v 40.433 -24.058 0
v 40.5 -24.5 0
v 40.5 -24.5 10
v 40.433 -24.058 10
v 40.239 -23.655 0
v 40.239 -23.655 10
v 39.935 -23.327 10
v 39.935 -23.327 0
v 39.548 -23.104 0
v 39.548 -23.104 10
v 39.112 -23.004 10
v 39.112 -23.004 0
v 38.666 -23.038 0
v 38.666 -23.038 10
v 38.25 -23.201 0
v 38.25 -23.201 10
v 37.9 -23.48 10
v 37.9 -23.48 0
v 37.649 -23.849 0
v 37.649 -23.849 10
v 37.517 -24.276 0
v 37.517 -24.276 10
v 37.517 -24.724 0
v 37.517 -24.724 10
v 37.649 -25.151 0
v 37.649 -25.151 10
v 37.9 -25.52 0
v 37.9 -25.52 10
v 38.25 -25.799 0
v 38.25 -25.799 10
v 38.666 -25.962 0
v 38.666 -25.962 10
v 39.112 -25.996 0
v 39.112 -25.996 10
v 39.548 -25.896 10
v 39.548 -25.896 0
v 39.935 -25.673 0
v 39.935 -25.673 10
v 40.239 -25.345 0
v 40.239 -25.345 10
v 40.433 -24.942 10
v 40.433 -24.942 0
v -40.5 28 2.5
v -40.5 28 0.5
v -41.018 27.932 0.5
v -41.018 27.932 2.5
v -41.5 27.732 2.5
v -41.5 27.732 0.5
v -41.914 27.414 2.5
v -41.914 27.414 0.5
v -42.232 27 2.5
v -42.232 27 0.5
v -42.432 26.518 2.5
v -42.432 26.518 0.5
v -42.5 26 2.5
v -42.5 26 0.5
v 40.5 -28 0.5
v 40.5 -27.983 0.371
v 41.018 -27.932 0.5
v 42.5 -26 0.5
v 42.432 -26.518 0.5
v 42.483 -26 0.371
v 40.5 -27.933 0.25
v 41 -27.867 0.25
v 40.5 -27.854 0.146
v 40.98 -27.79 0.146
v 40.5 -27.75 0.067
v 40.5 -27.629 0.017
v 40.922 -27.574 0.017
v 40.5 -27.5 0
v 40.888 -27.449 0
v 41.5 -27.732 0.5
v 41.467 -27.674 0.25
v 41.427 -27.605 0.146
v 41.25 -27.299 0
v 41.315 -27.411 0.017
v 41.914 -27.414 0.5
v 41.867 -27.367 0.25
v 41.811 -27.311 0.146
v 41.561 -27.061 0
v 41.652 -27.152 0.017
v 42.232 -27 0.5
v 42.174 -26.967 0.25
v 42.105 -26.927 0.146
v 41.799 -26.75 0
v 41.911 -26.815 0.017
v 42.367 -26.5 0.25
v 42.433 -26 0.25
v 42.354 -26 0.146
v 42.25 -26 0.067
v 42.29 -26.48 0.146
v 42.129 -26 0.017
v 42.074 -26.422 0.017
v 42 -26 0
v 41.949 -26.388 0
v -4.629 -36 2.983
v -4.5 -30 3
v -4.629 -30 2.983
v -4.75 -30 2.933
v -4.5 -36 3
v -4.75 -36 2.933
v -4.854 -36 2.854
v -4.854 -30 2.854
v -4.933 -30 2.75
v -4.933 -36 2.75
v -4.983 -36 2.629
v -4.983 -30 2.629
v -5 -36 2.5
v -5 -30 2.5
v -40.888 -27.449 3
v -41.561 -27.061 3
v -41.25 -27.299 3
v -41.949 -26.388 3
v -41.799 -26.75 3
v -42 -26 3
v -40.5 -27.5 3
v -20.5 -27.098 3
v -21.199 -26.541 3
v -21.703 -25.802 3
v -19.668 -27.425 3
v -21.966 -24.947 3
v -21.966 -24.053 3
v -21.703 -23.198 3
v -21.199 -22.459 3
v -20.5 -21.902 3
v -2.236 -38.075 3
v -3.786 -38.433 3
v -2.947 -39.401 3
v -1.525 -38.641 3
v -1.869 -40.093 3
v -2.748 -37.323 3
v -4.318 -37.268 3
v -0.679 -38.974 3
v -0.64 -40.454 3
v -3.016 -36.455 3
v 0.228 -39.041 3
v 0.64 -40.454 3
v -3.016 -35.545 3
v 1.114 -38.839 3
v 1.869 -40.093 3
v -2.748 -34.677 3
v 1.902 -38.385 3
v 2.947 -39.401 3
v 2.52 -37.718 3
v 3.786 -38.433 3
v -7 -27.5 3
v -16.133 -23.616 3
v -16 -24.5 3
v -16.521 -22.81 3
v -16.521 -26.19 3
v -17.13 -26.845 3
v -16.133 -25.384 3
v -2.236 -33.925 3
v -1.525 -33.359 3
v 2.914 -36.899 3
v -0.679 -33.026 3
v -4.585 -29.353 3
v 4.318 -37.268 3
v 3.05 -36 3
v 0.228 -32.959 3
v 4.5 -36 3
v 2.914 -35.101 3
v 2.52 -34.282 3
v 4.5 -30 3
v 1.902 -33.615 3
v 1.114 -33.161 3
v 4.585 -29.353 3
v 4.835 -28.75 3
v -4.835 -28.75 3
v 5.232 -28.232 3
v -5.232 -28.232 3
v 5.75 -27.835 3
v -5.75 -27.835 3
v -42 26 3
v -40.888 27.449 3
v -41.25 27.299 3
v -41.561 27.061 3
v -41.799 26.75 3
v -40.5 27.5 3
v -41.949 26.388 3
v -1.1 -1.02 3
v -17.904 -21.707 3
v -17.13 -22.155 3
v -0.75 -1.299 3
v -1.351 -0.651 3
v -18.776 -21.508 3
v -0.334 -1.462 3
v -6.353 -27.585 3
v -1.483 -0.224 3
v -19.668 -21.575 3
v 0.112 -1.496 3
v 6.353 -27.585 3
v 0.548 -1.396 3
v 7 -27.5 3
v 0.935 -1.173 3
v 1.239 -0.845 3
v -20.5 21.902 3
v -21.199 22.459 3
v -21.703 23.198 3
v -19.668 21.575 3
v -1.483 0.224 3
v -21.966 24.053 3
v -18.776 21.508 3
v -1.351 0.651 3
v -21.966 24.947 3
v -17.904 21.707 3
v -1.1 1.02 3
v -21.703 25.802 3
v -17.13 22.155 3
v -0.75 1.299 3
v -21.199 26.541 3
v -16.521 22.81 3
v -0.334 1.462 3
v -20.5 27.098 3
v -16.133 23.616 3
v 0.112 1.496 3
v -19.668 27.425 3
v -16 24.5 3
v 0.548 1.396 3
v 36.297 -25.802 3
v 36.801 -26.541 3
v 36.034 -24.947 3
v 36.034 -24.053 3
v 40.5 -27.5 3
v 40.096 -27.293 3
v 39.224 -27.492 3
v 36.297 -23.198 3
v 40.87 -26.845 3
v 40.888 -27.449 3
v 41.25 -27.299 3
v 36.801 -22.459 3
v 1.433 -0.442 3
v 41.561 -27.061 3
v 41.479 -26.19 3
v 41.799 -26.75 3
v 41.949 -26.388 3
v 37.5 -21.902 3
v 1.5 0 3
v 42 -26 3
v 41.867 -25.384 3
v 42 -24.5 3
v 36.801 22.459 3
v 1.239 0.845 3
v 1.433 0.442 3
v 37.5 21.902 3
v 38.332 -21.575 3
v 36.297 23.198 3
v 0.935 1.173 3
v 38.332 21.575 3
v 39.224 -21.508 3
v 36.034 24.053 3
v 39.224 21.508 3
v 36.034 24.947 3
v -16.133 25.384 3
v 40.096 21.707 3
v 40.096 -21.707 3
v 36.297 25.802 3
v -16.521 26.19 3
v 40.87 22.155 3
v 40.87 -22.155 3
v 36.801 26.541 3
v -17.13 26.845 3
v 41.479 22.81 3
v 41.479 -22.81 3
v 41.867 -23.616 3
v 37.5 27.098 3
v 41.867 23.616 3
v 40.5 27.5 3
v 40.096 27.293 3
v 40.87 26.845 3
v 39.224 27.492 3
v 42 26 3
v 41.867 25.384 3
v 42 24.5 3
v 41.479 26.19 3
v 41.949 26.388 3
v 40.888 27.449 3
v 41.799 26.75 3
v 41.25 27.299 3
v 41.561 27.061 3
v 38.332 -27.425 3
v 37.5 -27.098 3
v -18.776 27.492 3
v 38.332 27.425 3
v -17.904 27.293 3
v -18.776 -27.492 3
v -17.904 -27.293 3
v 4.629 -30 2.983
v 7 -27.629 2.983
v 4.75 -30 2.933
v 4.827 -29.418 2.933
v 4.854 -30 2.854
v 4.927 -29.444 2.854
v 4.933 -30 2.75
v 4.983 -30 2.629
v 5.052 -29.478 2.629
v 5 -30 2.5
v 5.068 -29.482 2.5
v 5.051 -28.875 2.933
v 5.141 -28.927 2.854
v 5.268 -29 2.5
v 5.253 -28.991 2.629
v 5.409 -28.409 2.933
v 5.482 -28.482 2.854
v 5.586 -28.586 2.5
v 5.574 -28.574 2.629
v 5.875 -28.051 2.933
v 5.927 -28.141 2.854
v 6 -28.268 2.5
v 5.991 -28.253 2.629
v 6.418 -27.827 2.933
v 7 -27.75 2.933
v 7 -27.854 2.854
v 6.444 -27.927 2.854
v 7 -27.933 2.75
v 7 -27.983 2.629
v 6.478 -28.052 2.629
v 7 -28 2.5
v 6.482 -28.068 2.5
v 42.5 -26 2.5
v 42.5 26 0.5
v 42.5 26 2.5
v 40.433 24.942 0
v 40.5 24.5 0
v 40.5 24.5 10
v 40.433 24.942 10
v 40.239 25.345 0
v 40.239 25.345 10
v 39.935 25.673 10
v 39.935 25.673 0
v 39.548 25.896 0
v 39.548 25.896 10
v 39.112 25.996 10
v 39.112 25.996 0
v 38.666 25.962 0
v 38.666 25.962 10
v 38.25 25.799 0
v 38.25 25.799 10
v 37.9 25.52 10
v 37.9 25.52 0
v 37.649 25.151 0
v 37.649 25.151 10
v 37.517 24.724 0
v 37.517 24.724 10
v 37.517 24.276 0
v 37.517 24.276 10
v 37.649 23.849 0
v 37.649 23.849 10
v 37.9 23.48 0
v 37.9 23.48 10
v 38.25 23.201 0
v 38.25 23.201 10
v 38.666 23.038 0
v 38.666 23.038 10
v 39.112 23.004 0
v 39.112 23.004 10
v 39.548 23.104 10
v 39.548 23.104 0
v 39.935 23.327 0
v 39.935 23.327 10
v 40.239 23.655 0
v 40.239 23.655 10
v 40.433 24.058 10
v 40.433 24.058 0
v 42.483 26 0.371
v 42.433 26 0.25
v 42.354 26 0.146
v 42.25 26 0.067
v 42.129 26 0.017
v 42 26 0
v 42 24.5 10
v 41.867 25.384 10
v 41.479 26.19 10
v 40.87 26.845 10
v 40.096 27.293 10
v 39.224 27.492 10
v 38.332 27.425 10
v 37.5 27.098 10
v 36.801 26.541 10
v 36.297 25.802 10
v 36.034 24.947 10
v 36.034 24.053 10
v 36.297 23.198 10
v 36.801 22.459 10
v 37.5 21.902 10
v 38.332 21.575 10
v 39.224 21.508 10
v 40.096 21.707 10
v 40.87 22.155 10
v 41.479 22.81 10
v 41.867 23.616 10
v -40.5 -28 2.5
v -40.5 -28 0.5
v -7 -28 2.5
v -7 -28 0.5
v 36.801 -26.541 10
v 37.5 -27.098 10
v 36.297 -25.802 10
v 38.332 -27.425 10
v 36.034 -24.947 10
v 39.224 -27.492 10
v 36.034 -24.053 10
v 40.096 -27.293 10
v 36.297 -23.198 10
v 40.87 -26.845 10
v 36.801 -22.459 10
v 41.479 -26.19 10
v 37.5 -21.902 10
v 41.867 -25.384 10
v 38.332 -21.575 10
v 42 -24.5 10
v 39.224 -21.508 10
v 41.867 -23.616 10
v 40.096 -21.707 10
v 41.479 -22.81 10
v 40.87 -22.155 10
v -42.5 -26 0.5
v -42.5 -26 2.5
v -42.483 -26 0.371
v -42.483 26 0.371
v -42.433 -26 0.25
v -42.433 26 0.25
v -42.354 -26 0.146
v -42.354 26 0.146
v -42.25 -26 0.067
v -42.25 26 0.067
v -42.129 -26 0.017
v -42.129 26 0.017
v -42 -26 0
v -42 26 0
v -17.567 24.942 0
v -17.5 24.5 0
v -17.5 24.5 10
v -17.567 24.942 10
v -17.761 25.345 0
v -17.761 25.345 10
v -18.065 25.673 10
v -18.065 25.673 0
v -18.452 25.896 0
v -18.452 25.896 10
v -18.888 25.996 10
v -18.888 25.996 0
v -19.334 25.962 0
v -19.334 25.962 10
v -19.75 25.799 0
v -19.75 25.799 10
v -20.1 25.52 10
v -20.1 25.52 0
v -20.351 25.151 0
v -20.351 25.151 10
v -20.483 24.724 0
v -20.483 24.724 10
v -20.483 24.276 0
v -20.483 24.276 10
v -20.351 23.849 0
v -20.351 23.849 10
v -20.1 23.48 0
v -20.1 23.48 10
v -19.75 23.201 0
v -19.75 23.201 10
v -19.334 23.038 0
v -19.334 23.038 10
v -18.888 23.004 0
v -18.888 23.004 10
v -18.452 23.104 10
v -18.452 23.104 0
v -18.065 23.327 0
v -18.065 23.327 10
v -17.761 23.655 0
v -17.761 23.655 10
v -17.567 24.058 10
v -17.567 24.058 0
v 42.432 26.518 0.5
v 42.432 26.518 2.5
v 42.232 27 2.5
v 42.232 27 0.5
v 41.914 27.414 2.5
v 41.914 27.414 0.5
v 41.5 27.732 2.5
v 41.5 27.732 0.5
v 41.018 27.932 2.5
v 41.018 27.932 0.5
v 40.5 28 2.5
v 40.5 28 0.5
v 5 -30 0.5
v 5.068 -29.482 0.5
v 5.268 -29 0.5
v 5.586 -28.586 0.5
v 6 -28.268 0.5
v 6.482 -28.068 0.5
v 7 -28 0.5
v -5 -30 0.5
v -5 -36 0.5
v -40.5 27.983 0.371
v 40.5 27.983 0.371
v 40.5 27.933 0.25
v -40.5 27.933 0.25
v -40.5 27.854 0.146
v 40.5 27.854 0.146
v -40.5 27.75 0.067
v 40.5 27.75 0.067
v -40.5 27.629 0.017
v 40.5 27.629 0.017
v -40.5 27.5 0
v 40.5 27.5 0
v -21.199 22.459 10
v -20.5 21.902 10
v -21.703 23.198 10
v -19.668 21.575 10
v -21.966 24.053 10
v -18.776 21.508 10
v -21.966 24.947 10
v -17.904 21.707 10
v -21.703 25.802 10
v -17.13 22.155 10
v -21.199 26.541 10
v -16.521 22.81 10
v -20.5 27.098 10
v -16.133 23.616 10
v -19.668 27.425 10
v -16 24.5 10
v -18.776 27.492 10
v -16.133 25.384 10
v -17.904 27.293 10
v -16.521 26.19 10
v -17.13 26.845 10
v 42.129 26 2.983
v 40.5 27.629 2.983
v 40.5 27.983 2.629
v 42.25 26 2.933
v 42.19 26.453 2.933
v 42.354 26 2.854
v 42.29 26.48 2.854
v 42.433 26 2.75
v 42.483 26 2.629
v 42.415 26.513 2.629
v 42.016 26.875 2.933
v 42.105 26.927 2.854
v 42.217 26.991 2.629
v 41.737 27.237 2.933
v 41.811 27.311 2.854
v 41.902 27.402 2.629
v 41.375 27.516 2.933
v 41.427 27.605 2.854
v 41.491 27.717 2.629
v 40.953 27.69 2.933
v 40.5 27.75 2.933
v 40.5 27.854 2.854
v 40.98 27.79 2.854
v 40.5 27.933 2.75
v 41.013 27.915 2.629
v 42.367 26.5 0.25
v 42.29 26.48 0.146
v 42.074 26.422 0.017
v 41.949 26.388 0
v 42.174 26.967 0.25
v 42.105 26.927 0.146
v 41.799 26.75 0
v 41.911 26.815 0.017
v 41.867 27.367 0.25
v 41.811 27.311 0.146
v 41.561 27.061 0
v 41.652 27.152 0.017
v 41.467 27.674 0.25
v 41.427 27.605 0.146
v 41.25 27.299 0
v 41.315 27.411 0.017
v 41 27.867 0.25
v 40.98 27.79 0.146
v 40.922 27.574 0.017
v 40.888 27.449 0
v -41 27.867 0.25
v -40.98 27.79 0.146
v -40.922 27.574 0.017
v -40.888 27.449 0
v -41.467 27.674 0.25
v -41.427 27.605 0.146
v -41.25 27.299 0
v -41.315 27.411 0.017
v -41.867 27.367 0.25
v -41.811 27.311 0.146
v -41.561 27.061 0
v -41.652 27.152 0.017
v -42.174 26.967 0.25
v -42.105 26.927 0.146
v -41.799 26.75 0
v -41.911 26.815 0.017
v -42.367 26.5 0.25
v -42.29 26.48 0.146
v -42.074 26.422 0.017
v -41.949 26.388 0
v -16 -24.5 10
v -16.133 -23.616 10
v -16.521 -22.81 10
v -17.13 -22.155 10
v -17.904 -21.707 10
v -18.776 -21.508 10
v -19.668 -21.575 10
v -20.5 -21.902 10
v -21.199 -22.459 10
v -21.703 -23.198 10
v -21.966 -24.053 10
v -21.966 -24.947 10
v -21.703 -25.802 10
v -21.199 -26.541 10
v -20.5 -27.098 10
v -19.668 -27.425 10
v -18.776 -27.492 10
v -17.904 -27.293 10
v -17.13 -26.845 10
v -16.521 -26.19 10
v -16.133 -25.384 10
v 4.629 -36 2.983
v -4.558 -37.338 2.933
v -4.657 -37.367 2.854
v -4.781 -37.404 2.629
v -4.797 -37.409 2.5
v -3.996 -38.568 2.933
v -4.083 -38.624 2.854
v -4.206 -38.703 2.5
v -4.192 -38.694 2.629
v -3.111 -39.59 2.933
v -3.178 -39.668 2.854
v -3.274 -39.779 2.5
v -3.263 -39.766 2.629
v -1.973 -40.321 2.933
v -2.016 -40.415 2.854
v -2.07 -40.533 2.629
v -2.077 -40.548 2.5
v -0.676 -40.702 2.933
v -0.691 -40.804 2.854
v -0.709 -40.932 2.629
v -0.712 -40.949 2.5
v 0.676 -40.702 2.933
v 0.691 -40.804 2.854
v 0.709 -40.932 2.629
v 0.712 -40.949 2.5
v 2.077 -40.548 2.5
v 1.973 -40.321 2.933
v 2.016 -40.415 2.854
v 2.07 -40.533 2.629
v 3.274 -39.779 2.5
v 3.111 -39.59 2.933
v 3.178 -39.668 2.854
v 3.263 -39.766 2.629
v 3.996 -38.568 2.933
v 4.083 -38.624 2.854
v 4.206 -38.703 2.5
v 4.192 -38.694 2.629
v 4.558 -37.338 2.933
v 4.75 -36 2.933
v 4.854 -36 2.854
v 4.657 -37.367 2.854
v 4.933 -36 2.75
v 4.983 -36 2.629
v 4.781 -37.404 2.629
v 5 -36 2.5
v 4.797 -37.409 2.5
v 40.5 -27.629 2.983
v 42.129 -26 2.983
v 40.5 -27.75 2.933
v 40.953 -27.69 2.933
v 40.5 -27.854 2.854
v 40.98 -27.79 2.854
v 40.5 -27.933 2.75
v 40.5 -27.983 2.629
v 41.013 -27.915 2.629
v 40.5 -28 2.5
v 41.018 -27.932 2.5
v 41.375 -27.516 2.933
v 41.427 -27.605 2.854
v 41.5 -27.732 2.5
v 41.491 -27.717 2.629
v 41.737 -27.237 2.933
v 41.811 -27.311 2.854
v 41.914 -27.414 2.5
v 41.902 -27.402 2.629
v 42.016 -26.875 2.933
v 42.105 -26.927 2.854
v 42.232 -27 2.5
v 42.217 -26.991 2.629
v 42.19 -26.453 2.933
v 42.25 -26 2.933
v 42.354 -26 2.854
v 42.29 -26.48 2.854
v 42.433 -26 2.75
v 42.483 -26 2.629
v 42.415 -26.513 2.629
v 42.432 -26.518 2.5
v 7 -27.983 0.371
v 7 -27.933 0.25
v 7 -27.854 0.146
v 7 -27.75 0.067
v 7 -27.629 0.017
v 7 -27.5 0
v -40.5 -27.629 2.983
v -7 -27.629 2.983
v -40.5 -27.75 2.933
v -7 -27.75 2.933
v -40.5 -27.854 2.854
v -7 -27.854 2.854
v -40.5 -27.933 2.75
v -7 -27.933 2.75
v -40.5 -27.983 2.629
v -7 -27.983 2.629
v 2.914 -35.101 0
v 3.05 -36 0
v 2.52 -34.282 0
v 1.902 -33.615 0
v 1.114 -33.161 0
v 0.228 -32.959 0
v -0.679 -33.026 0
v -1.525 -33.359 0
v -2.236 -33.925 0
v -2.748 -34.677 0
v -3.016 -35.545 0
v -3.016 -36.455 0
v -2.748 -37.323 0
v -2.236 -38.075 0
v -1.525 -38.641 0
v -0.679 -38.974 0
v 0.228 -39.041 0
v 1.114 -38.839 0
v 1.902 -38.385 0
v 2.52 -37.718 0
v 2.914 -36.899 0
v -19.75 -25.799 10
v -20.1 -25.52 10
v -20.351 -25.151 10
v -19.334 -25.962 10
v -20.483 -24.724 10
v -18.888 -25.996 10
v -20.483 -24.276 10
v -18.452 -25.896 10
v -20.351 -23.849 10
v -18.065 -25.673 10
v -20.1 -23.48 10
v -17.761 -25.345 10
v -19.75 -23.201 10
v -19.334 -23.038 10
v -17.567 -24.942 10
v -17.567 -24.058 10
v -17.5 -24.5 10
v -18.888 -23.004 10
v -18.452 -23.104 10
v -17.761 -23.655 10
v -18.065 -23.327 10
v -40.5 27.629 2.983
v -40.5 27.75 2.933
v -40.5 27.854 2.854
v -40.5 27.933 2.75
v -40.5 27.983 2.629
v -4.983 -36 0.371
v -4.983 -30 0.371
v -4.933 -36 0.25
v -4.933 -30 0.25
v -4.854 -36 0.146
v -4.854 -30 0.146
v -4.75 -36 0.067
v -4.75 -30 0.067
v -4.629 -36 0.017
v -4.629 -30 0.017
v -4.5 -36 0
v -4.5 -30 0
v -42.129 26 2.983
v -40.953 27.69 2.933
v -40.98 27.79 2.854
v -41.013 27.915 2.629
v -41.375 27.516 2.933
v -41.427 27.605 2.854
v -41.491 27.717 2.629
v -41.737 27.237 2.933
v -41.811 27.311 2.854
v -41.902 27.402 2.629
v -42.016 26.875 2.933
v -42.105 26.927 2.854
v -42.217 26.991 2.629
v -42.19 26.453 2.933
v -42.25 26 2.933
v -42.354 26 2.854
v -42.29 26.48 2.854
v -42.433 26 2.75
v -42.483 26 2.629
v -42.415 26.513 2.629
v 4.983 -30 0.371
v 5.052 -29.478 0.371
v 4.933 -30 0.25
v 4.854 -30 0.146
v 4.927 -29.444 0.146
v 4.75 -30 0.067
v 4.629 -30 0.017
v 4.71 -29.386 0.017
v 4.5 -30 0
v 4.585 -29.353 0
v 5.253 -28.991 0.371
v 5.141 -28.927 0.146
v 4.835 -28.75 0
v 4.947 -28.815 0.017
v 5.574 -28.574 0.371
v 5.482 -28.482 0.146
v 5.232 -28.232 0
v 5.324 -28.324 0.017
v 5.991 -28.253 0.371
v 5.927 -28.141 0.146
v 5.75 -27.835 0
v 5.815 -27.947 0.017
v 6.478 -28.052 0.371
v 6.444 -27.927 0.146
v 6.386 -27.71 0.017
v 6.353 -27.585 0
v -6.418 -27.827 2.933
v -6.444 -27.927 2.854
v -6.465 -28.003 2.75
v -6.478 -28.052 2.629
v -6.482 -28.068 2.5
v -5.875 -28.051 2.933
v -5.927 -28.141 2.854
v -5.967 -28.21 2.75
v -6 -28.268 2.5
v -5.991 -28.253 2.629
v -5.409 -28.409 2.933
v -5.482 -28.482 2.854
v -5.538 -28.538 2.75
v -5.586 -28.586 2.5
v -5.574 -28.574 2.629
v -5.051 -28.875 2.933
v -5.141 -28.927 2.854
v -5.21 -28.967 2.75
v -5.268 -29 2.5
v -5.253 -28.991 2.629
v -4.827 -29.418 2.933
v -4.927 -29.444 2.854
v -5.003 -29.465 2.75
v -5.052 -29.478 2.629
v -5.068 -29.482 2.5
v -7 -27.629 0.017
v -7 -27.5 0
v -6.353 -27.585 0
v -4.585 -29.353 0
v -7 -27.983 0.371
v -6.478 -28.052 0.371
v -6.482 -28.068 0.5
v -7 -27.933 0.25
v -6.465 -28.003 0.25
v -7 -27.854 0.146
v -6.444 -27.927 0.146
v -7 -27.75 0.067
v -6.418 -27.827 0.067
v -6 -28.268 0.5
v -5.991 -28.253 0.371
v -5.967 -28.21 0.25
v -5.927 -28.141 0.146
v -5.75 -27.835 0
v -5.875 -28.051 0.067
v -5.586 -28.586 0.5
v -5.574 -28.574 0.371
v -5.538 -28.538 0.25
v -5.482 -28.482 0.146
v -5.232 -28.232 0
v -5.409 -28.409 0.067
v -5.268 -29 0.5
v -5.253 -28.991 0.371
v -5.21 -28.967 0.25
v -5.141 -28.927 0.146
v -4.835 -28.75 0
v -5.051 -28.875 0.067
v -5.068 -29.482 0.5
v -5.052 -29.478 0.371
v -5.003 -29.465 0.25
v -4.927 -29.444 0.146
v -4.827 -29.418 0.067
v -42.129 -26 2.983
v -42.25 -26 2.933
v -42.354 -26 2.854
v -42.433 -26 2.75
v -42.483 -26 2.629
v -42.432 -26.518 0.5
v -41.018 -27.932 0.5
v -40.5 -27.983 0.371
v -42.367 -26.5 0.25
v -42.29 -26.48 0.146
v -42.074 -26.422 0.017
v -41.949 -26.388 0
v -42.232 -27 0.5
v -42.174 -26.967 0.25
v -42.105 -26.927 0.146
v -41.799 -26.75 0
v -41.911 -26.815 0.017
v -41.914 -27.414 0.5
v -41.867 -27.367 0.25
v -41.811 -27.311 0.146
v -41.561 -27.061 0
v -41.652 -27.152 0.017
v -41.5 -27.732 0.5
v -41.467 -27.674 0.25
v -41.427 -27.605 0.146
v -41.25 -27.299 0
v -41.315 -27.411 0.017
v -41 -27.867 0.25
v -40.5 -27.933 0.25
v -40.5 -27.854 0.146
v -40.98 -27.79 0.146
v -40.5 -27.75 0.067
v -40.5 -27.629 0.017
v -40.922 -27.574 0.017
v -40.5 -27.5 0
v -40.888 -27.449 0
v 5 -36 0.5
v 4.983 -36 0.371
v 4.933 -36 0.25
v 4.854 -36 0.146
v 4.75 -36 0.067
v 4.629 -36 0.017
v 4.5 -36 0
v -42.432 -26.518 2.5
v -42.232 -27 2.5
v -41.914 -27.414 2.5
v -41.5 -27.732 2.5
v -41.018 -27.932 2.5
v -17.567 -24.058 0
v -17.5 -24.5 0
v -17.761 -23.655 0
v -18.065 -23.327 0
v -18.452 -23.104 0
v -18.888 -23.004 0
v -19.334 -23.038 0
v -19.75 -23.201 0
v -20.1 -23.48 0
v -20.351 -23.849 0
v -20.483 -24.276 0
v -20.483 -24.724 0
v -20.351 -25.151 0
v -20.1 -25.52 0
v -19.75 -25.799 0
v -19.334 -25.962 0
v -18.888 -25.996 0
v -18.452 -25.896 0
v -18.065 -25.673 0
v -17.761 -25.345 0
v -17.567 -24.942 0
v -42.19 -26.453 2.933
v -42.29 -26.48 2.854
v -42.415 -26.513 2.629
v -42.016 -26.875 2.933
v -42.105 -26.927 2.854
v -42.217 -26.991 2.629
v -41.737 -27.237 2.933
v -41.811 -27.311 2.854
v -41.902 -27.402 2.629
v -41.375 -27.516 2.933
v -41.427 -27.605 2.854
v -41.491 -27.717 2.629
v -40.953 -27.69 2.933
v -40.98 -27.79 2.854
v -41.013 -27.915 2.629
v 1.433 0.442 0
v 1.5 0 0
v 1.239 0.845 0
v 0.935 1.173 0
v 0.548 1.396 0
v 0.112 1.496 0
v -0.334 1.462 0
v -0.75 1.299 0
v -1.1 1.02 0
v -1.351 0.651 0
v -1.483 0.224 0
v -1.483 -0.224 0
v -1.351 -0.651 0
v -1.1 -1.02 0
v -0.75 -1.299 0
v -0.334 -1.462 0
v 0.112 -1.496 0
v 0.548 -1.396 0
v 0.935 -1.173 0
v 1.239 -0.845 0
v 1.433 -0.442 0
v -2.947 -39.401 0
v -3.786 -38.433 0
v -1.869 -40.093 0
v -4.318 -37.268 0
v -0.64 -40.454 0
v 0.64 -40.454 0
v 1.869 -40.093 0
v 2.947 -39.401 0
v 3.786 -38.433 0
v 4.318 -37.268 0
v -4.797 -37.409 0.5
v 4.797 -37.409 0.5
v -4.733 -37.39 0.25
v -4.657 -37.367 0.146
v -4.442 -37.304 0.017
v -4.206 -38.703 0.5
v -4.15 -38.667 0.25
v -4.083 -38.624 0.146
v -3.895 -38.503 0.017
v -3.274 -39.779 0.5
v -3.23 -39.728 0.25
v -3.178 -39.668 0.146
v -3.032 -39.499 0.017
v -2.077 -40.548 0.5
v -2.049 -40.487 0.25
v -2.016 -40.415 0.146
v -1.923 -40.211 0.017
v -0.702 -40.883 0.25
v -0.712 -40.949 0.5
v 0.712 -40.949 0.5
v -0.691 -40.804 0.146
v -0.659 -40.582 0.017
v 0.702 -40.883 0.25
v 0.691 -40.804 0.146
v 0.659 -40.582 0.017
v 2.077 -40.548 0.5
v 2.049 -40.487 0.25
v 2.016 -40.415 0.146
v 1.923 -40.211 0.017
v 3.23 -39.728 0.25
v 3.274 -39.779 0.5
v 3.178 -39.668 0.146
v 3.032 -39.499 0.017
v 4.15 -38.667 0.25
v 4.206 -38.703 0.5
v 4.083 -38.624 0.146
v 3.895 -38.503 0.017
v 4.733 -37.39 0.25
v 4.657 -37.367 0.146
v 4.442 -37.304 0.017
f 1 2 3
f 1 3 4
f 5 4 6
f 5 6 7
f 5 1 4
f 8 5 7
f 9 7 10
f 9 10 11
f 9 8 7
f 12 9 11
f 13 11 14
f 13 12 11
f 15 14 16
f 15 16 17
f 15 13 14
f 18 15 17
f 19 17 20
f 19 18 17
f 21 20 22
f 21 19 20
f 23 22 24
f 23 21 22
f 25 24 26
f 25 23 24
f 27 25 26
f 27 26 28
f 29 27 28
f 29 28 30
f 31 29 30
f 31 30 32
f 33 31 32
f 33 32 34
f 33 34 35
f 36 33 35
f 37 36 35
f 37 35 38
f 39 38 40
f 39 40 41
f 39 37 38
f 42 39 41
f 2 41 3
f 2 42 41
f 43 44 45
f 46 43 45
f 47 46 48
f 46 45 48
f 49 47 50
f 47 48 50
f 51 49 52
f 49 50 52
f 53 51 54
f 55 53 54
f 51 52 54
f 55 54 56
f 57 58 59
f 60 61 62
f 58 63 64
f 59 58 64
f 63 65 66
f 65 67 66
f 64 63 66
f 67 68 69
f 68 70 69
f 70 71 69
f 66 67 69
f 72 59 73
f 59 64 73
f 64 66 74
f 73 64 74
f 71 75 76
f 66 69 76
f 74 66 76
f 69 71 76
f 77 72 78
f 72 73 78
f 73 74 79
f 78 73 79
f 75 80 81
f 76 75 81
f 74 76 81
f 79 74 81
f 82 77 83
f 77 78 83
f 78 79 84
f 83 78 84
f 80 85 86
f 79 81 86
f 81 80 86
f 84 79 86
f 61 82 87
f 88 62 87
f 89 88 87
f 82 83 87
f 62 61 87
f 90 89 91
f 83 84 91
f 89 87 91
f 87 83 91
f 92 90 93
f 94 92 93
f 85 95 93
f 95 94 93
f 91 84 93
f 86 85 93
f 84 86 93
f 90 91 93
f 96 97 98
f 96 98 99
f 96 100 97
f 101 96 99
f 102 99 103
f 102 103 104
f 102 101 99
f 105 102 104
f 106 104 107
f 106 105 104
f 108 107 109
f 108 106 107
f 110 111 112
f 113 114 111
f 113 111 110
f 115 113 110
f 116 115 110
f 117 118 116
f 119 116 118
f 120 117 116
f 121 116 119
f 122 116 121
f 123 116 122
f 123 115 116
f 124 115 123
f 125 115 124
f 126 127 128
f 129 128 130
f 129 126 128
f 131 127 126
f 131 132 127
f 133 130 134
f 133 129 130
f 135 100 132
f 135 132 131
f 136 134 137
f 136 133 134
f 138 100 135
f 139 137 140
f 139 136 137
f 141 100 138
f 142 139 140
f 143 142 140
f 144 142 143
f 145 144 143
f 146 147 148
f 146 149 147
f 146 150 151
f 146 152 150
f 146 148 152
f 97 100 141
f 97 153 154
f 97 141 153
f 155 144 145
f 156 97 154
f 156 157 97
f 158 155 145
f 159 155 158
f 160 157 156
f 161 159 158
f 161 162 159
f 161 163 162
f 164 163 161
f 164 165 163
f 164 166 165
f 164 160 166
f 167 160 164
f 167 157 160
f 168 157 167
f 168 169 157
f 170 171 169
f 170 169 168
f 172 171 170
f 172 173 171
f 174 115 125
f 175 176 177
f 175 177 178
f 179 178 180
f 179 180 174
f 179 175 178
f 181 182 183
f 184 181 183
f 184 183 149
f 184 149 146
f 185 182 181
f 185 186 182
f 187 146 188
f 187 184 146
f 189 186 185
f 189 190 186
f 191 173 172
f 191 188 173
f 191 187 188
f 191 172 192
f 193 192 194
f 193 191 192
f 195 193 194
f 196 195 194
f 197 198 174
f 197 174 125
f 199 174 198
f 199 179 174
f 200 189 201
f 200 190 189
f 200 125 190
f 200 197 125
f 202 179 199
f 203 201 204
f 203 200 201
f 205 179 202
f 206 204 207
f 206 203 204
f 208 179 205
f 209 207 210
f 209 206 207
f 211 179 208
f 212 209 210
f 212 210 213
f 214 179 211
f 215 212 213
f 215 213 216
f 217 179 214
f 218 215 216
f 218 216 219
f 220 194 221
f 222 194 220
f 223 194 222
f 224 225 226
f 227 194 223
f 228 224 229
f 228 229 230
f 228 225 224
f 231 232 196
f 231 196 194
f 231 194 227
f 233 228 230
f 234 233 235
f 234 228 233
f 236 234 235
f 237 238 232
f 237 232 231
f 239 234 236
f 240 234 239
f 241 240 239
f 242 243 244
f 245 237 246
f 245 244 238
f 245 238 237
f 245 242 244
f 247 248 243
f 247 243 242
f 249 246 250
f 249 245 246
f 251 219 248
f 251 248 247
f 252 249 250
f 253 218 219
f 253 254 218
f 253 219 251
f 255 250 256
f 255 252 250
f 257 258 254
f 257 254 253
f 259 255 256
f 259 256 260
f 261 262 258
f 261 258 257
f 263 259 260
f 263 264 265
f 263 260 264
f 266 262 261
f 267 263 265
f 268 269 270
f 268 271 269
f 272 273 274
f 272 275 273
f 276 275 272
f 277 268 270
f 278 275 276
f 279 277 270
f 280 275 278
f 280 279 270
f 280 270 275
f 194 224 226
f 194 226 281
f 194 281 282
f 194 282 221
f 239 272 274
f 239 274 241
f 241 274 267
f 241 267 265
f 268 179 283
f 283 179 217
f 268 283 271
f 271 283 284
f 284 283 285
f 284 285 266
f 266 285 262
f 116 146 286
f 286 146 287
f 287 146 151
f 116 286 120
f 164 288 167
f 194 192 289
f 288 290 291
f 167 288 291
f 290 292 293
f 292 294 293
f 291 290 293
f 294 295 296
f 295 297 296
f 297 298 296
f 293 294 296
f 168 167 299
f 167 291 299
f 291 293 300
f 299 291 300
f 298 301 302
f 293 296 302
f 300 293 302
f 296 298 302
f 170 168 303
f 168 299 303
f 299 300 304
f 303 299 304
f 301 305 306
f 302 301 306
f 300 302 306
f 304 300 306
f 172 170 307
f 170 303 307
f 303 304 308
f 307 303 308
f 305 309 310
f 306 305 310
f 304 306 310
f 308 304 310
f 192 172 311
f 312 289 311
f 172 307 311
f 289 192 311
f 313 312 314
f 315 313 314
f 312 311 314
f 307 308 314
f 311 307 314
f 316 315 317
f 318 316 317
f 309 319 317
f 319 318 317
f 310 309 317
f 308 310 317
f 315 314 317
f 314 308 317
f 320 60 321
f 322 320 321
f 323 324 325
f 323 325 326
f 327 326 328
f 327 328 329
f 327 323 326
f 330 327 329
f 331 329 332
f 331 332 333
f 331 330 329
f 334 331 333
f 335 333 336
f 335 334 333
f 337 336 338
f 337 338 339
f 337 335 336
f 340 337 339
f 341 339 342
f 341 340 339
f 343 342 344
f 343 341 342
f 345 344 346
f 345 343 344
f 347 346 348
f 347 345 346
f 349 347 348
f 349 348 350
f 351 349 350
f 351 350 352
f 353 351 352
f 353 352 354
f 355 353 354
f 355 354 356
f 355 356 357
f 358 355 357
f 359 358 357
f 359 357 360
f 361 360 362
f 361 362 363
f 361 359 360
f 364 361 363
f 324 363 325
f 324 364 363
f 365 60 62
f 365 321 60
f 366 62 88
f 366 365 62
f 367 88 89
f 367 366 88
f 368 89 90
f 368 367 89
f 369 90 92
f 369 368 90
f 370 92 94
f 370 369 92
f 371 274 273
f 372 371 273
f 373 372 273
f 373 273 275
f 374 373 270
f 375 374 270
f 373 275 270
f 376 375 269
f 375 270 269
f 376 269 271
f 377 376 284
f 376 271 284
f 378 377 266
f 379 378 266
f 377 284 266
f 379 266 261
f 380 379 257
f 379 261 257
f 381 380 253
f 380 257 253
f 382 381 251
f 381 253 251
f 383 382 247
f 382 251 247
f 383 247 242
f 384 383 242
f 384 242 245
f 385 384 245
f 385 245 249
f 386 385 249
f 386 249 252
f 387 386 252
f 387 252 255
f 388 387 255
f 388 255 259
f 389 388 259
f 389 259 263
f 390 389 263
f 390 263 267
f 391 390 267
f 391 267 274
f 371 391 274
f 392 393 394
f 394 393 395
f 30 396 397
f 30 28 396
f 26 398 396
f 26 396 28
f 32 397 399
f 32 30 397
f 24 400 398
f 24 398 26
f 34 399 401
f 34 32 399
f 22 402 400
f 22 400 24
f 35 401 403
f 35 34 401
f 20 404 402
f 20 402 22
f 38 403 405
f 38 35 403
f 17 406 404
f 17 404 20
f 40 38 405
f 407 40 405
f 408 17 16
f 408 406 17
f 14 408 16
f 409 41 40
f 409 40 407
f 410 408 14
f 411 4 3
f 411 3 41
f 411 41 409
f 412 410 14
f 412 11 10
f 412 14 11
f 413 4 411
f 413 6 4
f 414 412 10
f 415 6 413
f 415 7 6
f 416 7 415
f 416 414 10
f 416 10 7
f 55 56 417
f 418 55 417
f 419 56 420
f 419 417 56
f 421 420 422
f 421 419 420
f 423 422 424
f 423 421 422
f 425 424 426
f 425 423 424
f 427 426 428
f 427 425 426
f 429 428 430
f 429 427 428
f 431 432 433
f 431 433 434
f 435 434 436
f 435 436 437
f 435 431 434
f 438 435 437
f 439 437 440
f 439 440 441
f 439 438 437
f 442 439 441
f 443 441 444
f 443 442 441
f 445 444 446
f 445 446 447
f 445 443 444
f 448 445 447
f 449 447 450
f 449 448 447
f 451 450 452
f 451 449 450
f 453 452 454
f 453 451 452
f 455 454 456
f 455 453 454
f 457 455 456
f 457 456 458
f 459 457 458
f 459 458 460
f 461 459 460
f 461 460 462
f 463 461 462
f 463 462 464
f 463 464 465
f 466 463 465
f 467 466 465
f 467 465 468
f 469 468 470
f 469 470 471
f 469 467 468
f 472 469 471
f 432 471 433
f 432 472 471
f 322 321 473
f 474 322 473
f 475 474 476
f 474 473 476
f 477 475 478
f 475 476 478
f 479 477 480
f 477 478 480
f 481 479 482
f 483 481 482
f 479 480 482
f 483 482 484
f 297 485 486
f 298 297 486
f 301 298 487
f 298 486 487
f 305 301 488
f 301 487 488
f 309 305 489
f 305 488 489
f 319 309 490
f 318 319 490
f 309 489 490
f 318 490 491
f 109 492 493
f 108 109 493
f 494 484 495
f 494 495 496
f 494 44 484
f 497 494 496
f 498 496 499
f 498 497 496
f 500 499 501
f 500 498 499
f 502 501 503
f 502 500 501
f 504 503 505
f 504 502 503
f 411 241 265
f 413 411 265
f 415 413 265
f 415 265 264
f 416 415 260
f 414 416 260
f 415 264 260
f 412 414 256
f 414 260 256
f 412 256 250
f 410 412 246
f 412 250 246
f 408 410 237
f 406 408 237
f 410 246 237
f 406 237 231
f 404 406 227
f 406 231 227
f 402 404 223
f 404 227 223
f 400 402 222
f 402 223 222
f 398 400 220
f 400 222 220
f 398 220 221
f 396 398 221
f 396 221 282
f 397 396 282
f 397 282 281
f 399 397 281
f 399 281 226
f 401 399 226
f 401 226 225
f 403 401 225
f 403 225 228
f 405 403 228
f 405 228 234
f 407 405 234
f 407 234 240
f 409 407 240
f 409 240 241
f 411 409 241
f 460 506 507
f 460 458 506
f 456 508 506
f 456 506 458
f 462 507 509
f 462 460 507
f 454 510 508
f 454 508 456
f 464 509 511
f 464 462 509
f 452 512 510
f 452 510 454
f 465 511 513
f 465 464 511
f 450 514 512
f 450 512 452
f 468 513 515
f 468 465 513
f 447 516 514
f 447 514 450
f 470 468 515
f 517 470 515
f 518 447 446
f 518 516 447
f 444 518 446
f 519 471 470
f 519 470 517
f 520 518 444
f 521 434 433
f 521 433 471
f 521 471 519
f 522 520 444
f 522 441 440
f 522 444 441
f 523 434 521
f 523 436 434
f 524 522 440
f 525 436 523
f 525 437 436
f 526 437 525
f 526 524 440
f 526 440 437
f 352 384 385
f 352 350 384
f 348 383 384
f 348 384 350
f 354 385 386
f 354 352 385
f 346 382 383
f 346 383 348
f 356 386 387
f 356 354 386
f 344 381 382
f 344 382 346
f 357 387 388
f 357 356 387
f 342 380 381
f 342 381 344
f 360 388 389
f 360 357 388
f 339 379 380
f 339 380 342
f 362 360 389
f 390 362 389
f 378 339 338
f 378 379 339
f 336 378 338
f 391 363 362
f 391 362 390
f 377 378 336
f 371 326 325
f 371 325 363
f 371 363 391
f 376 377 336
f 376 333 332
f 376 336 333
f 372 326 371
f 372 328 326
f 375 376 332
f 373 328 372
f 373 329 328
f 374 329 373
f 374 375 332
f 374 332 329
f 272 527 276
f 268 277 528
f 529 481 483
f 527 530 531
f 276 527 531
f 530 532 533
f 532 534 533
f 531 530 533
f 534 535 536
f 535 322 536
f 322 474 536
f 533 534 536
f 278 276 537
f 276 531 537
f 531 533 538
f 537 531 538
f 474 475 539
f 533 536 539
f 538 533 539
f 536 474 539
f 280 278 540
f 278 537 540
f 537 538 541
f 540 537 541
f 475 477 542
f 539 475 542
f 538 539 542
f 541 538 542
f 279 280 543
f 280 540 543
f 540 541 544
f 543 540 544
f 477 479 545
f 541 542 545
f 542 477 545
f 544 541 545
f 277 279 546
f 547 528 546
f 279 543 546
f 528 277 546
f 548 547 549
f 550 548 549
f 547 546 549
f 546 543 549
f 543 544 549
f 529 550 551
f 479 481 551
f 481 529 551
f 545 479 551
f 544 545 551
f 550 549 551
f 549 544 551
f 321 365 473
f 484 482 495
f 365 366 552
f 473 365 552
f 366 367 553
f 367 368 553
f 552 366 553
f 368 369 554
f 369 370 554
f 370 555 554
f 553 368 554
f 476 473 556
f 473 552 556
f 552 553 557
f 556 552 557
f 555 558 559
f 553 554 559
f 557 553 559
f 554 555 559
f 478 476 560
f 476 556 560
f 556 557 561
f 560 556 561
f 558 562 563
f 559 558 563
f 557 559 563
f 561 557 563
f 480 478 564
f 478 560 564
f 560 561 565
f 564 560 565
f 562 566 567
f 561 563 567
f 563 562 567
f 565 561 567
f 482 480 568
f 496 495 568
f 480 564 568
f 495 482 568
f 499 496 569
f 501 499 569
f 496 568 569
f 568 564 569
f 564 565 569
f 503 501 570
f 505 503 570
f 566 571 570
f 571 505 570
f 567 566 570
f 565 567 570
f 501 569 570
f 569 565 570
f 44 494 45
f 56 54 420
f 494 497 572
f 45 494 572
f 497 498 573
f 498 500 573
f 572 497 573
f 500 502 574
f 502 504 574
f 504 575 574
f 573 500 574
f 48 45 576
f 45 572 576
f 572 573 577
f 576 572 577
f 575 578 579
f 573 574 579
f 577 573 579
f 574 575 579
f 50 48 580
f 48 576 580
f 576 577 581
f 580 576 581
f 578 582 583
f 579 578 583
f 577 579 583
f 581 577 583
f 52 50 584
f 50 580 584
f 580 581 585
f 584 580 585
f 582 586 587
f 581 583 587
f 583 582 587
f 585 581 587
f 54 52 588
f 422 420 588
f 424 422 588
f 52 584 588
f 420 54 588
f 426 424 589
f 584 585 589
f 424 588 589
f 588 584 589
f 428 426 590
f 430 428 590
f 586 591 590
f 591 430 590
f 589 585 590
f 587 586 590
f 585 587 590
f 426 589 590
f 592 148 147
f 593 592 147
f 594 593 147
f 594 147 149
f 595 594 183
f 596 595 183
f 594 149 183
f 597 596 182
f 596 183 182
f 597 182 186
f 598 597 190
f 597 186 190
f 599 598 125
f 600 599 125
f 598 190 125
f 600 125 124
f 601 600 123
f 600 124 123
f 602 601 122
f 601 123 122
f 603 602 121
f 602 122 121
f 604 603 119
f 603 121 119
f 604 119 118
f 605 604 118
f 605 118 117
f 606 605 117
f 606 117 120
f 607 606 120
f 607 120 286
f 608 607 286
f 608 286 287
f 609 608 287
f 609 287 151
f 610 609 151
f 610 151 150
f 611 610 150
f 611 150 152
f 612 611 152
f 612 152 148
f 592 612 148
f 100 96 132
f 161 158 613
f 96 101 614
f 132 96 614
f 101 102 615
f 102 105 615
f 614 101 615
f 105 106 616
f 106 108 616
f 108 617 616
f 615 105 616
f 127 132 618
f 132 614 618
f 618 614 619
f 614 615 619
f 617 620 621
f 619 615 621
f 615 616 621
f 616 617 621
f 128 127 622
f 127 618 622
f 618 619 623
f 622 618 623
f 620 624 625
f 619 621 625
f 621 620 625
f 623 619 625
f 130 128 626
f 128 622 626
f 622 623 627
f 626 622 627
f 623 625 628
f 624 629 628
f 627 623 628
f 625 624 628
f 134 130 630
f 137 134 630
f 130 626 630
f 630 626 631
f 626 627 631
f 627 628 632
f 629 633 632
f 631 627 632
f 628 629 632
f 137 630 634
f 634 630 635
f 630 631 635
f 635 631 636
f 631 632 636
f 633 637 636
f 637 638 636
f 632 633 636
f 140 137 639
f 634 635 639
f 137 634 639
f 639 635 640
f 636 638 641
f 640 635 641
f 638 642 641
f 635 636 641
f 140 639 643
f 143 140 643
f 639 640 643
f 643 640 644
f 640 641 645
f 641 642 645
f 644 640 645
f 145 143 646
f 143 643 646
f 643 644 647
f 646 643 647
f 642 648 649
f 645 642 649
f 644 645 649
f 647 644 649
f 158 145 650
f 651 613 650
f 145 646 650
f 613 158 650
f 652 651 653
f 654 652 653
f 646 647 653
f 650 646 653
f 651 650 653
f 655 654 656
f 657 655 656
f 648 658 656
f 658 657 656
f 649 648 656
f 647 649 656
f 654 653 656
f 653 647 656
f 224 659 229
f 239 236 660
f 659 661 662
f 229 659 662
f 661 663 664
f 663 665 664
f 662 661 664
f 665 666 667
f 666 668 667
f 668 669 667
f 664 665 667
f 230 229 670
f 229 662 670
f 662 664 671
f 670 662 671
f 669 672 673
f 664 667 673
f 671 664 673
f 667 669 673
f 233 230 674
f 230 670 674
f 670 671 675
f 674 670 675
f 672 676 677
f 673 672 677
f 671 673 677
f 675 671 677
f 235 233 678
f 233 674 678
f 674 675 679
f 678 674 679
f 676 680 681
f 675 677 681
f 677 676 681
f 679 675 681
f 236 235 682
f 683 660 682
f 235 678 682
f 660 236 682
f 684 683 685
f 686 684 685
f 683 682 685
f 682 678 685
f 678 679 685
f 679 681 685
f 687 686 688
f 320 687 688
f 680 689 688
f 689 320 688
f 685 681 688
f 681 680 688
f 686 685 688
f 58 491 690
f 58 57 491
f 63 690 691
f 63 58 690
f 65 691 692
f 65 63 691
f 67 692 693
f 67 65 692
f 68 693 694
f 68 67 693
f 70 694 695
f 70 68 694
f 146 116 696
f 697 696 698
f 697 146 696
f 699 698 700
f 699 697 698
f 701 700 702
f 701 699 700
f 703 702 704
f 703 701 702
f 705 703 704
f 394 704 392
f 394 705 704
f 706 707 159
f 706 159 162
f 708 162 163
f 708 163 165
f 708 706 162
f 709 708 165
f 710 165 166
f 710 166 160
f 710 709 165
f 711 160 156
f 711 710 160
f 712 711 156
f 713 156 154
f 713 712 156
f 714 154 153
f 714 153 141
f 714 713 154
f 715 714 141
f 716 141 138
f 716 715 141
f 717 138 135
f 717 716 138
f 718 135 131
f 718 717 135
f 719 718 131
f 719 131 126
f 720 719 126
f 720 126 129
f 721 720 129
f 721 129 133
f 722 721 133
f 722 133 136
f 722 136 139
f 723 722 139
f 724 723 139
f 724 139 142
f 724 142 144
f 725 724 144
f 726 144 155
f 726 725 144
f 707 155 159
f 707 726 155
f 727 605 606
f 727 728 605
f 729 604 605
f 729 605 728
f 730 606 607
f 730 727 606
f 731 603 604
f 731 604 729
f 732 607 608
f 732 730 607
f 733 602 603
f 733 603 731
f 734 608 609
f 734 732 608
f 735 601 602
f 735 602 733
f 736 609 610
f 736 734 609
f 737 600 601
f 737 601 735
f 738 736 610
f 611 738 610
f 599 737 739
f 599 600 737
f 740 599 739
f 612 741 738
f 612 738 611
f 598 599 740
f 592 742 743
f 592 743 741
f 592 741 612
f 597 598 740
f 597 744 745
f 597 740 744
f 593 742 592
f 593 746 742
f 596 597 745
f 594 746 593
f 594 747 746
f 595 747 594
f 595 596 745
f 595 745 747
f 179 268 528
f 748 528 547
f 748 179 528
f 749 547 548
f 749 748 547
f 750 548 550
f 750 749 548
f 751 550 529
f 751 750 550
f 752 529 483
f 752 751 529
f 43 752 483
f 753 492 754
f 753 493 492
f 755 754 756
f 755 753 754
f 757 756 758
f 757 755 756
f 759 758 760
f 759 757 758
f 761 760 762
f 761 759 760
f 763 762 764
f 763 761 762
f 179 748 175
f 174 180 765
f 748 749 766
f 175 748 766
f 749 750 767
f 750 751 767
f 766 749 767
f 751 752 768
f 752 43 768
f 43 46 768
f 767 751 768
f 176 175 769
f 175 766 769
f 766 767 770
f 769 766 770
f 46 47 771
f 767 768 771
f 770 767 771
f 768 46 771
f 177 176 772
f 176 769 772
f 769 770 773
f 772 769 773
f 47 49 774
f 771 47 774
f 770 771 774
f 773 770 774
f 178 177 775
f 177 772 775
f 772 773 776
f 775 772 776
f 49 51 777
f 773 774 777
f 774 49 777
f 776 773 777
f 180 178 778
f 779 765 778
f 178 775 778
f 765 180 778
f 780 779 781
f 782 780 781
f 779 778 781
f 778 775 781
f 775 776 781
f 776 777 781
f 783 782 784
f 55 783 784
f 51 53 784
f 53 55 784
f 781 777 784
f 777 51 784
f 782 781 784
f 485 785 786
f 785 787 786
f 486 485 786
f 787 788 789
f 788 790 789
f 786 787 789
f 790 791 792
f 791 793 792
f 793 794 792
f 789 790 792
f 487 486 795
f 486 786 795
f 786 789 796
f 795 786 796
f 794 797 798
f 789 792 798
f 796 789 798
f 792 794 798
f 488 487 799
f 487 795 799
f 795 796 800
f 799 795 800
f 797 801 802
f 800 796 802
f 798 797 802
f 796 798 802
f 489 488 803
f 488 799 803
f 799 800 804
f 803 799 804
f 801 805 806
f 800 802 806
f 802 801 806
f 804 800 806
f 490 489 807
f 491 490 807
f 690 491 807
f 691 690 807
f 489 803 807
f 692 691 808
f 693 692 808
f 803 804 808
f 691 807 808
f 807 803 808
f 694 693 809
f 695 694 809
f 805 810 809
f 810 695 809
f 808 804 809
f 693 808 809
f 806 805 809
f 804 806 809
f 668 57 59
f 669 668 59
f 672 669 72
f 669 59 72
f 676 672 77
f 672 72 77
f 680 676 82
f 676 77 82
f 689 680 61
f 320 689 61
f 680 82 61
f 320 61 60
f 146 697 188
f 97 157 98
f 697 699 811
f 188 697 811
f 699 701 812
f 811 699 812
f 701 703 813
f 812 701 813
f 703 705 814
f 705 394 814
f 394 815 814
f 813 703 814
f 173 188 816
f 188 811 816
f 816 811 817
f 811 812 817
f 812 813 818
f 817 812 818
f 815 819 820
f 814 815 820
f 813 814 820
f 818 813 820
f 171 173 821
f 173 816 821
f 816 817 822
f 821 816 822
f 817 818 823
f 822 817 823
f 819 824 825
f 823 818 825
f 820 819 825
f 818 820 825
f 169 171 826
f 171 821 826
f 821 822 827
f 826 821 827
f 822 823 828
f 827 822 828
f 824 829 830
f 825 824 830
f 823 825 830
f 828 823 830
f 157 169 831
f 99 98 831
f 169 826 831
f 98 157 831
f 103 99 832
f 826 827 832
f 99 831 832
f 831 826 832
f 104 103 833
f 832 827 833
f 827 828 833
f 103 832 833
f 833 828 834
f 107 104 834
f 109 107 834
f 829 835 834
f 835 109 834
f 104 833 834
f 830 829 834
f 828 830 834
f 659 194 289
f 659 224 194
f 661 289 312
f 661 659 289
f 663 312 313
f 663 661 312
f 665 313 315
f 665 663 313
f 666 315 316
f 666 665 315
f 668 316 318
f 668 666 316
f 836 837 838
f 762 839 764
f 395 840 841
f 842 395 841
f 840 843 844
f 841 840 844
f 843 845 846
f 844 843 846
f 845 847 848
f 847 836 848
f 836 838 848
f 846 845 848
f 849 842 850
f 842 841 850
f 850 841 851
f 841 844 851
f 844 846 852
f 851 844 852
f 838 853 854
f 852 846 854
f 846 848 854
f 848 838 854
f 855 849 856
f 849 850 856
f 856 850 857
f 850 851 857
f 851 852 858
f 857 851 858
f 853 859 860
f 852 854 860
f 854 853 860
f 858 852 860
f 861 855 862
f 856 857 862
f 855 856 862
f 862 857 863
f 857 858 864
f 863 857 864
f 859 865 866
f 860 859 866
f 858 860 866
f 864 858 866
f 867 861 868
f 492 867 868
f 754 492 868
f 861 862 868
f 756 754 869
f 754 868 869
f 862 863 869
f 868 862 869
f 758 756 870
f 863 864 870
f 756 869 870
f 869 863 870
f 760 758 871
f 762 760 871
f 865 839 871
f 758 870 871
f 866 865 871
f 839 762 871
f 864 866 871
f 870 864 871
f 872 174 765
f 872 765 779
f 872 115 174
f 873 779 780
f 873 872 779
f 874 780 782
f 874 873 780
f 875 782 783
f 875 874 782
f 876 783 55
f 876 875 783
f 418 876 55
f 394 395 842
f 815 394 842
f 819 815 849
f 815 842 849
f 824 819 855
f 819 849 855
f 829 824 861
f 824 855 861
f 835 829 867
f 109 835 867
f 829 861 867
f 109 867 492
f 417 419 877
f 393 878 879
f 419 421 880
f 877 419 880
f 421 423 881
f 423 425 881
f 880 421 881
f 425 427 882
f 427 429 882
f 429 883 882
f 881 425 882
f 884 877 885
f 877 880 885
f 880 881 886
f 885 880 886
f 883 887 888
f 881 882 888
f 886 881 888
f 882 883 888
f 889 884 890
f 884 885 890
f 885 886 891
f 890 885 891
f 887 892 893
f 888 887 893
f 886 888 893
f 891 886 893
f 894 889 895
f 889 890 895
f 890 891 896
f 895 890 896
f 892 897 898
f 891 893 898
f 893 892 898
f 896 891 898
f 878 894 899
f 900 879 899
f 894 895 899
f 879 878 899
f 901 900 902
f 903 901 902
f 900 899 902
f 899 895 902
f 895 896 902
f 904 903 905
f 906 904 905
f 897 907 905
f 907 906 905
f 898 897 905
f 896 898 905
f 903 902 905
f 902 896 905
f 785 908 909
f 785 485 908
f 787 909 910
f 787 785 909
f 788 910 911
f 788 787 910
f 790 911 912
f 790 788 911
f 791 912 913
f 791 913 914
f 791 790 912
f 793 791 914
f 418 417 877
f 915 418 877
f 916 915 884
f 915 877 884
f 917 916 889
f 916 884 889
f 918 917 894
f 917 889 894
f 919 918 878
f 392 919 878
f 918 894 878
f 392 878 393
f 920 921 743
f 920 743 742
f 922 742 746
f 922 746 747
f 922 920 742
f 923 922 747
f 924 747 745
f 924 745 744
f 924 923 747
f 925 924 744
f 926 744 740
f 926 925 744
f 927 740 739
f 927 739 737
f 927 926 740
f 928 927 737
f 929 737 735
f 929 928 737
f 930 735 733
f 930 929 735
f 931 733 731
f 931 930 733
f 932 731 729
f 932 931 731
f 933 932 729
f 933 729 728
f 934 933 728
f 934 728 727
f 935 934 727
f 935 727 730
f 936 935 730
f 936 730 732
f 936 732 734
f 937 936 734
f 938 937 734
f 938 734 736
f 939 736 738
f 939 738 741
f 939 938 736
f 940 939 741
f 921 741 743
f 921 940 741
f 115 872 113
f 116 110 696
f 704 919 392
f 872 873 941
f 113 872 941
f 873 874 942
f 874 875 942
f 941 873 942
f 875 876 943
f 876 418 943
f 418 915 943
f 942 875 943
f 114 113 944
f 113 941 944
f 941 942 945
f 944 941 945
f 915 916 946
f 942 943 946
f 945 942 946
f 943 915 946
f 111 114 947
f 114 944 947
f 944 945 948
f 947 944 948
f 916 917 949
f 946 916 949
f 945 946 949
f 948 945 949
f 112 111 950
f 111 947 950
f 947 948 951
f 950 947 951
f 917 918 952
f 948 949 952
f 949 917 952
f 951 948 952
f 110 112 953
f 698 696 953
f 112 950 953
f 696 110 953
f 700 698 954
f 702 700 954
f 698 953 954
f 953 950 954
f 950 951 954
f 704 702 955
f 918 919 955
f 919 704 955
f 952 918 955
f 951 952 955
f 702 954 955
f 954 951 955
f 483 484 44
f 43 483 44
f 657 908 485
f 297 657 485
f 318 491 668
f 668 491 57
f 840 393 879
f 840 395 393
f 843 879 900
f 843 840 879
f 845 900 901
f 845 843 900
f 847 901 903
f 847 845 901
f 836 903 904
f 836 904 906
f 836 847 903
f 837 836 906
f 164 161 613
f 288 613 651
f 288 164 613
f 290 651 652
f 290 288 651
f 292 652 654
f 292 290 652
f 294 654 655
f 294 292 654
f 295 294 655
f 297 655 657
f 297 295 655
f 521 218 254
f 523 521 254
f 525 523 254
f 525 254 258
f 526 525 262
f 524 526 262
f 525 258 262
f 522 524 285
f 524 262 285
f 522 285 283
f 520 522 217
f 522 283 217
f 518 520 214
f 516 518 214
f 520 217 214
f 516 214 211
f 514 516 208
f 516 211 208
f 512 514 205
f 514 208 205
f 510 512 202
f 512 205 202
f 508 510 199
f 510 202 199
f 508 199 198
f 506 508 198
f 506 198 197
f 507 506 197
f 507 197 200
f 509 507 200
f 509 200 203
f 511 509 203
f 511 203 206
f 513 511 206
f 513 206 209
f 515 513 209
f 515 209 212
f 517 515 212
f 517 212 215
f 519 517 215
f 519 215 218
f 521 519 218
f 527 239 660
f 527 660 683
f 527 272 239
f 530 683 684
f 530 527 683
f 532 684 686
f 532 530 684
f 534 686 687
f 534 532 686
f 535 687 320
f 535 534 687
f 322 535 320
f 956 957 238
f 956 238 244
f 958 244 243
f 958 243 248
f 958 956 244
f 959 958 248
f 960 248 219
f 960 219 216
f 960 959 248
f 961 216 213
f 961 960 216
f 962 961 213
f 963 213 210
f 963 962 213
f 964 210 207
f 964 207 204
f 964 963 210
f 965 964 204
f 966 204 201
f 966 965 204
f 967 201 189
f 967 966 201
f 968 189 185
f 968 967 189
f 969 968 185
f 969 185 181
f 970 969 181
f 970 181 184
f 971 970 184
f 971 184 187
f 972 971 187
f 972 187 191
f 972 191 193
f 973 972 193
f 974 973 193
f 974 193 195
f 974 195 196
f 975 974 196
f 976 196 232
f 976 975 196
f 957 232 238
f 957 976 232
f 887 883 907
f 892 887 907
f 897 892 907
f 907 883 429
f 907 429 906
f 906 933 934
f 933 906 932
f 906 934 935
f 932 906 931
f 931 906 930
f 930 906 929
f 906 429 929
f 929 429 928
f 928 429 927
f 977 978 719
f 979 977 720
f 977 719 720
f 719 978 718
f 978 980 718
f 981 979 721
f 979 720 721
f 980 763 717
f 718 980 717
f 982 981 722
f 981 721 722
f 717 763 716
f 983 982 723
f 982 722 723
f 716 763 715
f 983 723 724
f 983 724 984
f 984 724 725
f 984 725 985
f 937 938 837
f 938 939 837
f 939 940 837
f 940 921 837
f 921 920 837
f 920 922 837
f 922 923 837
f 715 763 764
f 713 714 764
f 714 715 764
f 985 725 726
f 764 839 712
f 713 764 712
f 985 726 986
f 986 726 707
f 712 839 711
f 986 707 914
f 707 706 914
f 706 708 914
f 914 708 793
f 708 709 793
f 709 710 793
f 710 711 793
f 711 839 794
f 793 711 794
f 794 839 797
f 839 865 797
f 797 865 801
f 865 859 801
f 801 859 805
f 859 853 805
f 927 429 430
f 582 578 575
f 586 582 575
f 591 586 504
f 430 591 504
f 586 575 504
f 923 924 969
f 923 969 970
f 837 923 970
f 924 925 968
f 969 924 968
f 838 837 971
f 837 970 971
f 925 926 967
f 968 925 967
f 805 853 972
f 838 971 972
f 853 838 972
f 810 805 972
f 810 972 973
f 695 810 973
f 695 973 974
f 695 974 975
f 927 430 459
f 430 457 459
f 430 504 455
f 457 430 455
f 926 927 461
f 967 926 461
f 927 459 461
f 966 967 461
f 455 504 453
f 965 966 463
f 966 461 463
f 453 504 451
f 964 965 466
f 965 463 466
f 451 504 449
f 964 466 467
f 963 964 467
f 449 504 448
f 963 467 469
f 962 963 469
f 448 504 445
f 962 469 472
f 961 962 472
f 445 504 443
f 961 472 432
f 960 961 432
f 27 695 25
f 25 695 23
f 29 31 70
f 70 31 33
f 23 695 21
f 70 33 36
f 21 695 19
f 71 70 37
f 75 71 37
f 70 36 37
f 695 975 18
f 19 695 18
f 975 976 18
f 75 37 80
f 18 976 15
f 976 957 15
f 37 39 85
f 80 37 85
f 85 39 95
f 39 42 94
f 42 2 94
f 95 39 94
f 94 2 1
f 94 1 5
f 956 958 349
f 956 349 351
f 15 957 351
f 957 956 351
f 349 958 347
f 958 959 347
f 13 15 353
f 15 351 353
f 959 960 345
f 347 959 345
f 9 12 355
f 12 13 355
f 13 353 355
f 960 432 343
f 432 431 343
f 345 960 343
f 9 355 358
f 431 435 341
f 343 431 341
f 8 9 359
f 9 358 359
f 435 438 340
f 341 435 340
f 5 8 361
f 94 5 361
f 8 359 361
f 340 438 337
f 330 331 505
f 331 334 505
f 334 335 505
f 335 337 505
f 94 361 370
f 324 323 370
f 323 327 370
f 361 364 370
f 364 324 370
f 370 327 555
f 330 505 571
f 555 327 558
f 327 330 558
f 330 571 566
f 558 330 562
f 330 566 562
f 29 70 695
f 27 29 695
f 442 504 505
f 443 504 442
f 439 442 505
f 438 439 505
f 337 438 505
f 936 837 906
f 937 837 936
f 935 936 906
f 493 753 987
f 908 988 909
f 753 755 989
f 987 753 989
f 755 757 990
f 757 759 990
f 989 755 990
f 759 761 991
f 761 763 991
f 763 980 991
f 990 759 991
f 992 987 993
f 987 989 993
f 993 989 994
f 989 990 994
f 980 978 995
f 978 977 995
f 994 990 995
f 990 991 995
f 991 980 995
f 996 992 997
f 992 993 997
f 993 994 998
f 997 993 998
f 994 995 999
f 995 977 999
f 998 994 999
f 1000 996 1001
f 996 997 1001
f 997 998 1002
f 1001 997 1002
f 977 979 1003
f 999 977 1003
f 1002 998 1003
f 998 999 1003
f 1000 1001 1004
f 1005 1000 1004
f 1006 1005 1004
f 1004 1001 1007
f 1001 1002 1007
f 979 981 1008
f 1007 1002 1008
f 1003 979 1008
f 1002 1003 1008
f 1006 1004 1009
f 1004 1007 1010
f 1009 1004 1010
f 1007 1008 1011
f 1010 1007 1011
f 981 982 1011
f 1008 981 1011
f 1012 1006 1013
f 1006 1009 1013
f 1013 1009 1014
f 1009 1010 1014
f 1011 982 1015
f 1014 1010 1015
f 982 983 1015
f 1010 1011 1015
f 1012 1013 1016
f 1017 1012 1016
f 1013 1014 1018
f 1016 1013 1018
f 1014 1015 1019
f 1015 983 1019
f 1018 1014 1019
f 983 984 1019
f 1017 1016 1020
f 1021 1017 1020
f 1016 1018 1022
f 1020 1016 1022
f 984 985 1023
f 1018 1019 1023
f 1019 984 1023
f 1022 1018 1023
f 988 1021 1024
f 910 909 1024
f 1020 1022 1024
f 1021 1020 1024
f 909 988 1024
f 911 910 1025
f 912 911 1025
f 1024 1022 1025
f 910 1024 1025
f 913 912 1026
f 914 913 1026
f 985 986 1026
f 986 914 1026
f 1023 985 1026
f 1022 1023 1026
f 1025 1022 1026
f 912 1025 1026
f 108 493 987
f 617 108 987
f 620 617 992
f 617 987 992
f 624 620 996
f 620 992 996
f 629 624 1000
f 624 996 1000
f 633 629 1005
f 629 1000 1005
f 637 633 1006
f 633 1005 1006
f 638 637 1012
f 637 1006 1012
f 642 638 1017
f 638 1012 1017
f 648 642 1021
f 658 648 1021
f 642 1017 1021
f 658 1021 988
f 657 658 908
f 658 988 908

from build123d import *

# Parameters (mm, degrees)
F0_R     = 3
F0_R_2   = 3.05
F0_R_3   = 1.5
F1_DEPTH = 3
F2_DEPTH = 10
F3_R     = 0.49999


# Not quite as in the source:
# - a fillet or chamfer is up to 0.001 mm smaller than in the source, because OpenCascade refuses the exact size
# - a feature names something its author has since deleted; it is built from what else it names


with BuildPart() as f1:
    # F0 (on Top) → F1 (new body)
    with BuildSketch(Plane.XY):
        with BuildLine():
            ThreePointArc((42.5, 26), (41.9142135624, 27.4142135624), (40.5, 28))
            Line((40.5, 28), (-40.5, 28))
            ThreePointArc((-40.5, 28), (-41.9142135624, 27.4142135624), (-42.5, 26))
            Line((-42.5, 26), (-42.5, -26))
            ThreePointArc((-42.5, -26), (-41.9142135624, -27.4142135624), (-40.5, -28))
            Line((-40.5, -28), (-7, -28))
            ThreePointArc((-7, -28), (-5.5857864376, -28.5857864376), (-5, -30))
            Line((-5, -30), (-5, -36))
            ThreePointArc((-5, -36), (0, -41), (5, -36))
            Line((5, -36), (5, -30))
            ThreePointArc((5, -30), (5.5857864376, -28.5857864376), (7, -28))
            Line((7, -28), (40.5, -28))
            ThreePointArc((40.5, -28), (41.9142135624, -27.4142135624), (42.5, -26))
            Line((42.5, -26), (42.5, 26))
        make_face()
        with Locations((-19, -24.5)):
            Circle(F0_R, mode=Mode.SUBTRACT)
        with Locations((0, -36)):
            Circle(F0_R_2, mode=Mode.SUBTRACT)
        with Locations((39, -24.5)):
            Circle(F0_R, mode=Mode.SUBTRACT)
        with Locations((-19, 24.5)):
            Circle(F0_R, mode=Mode.SUBTRACT)
        Circle(F0_R_3, mode=Mode.SUBTRACT)
        with Locations((39, 24.5)):
            Circle(F0_R, mode=Mode.SUBTRACT)
    extrude(amount=F1_DEPTH)

    # F0 (on Top) → F2 (join)
    with BuildSketch(Plane.XY):
        with Locations((-19, -24.5)):
            Circle(F0_R)
        with Locations((-19, -24.5)):
            Circle(F0_R_3, mode=Mode.SUBTRACT)
        with Locations((-19, 24.5)):
            Circle(F0_R)
        with Locations((-19, 24.5)):
            Circle(F0_R_3, mode=Mode.SUBTRACT)
        with Locations((39, 24.5)):
            Circle(F0_R)
        with Locations((39, 24.5)):
            Circle(F0_R_3, mode=Mode.SUBTRACT)
        with Locations((39, -24.5)):
            Circle(F0_R)
        with Locations((39, -24.5)):
            Circle(F0_R_3, mode=Mode.SUBTRACT)
    extrude(amount=F2_DEPTH)

    # F3 (radius 0.5 in the source; OpenCascade refuses exactly that, so slightly less here)
    f3_edges = [f1.edges().sort_by_distance(p)[0] for p in [
        (23.75, -28, 3),
        (23.75, -28, 0),
    ]]
    fillet(f3_edges, radius=F3_R)


solid = f1.part
